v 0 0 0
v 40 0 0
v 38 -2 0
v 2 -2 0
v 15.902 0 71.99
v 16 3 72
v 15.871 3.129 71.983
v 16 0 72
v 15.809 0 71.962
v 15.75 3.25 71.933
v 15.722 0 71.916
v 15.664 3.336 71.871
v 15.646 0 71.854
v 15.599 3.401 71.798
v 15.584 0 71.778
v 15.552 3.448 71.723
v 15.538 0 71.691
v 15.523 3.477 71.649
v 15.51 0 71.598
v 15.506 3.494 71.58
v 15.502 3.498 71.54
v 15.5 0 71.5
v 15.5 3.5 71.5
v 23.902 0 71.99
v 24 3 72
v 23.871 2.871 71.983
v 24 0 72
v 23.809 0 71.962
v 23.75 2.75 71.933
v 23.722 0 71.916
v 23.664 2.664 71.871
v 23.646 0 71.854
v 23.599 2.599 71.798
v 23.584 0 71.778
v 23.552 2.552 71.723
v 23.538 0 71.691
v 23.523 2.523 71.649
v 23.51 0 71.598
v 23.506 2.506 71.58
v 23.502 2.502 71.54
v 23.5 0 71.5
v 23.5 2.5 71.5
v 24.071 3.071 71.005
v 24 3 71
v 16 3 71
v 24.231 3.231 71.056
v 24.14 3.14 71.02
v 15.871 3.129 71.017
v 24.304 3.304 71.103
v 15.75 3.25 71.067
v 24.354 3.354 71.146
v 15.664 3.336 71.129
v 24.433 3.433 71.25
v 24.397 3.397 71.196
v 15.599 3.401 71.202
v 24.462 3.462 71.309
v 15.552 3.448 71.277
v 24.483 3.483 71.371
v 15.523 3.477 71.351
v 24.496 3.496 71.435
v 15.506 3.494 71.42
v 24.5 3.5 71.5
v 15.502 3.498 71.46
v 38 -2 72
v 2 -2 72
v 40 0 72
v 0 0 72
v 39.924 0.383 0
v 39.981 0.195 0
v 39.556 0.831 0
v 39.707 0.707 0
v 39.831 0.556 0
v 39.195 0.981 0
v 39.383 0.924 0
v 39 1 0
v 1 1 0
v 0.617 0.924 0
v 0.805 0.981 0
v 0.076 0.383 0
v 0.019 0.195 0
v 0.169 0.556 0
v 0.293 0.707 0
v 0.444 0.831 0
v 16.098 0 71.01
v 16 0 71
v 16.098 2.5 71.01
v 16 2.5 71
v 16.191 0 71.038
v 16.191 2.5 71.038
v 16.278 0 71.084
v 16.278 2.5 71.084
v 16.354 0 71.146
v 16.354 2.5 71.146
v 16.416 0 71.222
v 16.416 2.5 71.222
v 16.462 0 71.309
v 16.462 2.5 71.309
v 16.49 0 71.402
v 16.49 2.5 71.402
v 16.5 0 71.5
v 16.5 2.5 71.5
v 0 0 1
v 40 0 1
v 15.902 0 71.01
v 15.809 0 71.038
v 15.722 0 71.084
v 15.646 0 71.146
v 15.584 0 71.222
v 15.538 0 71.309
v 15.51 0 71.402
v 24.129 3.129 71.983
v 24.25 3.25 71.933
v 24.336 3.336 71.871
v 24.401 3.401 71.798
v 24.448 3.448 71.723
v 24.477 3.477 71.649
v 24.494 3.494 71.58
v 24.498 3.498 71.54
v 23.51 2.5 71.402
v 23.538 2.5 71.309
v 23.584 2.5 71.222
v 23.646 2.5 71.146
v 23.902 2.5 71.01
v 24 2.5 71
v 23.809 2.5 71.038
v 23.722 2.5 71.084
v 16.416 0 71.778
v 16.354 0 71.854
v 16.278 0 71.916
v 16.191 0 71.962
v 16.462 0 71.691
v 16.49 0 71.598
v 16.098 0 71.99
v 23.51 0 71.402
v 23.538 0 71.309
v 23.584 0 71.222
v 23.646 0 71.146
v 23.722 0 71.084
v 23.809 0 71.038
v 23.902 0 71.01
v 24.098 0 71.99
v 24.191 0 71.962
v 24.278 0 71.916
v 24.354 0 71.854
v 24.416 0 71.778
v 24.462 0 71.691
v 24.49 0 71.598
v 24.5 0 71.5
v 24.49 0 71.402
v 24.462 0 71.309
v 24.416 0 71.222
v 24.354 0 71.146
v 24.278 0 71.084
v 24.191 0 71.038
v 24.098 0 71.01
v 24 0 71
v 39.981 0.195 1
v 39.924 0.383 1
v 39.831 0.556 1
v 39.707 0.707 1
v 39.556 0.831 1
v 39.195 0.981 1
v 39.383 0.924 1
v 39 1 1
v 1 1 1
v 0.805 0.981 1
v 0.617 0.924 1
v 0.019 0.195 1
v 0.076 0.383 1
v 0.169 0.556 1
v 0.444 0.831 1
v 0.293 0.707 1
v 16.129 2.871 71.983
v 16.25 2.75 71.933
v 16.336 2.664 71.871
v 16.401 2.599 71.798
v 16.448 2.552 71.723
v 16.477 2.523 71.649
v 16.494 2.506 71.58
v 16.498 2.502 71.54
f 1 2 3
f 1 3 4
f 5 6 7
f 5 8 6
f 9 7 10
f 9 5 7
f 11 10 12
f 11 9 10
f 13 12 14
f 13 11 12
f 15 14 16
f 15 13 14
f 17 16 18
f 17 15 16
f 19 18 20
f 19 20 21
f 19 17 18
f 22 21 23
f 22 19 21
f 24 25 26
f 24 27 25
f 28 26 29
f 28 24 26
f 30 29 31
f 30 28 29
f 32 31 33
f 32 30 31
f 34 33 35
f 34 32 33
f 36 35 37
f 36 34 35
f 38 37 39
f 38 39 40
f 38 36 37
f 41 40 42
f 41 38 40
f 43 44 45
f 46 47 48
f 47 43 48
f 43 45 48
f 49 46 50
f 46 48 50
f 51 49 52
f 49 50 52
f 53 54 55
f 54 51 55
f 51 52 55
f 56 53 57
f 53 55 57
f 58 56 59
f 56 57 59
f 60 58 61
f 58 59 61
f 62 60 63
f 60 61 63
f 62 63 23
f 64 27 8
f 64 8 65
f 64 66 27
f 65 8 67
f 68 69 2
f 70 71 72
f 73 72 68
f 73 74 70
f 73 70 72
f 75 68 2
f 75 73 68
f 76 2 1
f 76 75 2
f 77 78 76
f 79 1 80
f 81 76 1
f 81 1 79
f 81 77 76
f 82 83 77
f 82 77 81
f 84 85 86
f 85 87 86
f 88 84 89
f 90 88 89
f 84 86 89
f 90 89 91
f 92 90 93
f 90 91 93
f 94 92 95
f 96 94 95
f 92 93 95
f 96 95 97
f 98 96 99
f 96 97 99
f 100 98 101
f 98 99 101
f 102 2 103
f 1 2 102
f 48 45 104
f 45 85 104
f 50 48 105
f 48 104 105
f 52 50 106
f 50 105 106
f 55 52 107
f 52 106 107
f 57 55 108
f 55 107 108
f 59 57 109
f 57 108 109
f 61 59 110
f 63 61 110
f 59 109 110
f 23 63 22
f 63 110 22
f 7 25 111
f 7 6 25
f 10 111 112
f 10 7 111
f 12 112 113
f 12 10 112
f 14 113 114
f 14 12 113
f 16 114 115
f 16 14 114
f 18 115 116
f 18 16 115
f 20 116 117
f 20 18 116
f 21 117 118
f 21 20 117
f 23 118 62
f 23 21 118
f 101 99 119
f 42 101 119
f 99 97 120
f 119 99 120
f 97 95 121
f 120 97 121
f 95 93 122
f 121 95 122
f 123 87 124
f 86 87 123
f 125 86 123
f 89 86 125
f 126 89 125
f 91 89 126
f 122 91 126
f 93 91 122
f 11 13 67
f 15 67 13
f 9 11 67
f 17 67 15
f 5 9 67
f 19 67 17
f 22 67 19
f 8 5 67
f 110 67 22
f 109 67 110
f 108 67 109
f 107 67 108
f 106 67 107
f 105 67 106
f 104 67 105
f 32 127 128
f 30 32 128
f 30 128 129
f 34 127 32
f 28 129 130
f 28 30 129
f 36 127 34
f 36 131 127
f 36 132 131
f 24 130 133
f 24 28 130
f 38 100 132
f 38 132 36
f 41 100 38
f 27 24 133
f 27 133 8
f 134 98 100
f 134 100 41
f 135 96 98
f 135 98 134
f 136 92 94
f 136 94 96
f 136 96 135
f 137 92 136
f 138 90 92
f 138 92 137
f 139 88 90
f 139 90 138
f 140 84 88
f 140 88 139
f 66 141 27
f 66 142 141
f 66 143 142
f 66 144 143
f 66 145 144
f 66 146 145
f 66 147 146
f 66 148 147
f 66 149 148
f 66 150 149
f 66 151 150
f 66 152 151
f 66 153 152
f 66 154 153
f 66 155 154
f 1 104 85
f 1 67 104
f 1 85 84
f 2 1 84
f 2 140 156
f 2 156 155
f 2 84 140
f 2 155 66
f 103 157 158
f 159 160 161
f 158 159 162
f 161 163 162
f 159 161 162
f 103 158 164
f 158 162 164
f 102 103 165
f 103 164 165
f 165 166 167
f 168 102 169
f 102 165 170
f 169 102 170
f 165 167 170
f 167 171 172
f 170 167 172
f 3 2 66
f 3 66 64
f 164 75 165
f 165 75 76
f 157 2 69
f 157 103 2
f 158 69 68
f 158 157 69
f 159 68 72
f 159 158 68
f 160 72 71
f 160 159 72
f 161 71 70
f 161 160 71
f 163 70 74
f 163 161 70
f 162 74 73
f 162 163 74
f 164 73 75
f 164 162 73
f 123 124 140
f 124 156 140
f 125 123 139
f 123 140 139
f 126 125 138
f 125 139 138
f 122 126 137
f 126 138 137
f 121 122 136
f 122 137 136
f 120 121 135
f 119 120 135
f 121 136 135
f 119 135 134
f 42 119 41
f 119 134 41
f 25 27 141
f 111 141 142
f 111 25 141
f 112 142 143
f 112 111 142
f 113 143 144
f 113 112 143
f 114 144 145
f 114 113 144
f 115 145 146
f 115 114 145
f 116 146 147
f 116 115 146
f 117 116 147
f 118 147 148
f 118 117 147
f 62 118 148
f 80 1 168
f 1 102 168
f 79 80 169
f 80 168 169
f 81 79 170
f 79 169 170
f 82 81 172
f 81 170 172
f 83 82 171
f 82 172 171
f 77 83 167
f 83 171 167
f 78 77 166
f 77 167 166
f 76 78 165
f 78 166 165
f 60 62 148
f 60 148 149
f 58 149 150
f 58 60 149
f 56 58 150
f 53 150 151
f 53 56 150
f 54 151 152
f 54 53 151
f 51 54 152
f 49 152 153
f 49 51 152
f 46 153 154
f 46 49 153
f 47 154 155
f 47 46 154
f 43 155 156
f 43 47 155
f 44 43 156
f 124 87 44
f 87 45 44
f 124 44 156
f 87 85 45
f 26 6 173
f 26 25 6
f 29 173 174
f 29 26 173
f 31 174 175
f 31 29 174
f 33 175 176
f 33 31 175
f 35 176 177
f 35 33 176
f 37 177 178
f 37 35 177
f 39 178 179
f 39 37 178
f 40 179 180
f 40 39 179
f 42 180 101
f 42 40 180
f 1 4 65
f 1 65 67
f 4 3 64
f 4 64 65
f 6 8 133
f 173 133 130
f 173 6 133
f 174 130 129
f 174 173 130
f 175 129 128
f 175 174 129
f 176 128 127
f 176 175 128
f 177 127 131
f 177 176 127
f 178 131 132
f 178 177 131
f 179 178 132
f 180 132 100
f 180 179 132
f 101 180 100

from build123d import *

# Parameters (mm, degrees)
BOSS_EXTRUDE7_DEPTH = 72
SKETCH9_W           = 40
SKETCH9_H           = 1
BOSS_EXTRUDE8_DEPTH = 1
FILLET2_R           = 1
BOSS_EXTRUDE9_START = 71
BOSS_EXTRUDE9_DEPTH = 1
FILLET3_R           = 0.5


with BuildPart() as part:
    # Sketch8 → Boss-Extrude7 (new body)
    with BuildSketch(Plane.XY):
        Polygon((0, 0), (40, 0), (38, -2), (2, -2), align=None)
    extrude(amount=BOSS_EXTRUDE7_DEPTH)

    # Sketch11 → Boss-Extrude9 (add)
    with BuildSketch(Plane.XY.offset(BOSS_EXTRUDE9_START)):
        Polygon((24.5, 3.5), (15.5, 3.5), (15.5, 0), (16.5, 0), (16.5, 2.5), (23.5, 2.5), (23.5, 0), (24.5, 0), align=None)
    extrude(amount=BOSS_EXTRUDE9_DEPTH)

    # Fillet3
    fillet3_edges = [part.edges().sort_by_distance(p)[0] for p in [
        (16.5, 1.25, 71),
        (24.5, 1.75, 71),
        (16.5, 1.25, 72),
        (20, 2.5, 72),
        (20, 3.5, 71),
        (20, 3.5, 72),
        (23.5, 1.25, 71),
        (23.5, 1.25, 72),
        (24.5, 1.75, 72),
        (15.5, 1.75, 71),
        (15.5, 1.75, 72),
    ]]
    fillet(fillet3_edges, radius=FILLET3_R - 0.0001)  # a hair under: the kernel refuses the full size


with BuildPart() as body_2:
    # Sketch9 → Boss-Extrude8 (new body)
    with BuildSketch(Plane(origin=(0, 0, 0), x_dir=(-1, 0, 0), z_dir=(0, 0, -1))):
        with Locations((-20, 0.5)):
            Rectangle(SKETCH9_W, SKETCH9_H)
    extrude(amount=-BOSS_EXTRUDE8_DEPTH)

    # Fillet2
    fillet2_edges = [body_2.edges().sort_by_distance(p)[0] for p in [
        (0, 1, 0.5),
        (40, 1, 0.5),
    ]]
    fillet(fillet2_edges, radius=FILLET2_R - 0.0001)  # a hair under: the kernel refuses the full size


solid = Compound([part.part, body_2.part])
